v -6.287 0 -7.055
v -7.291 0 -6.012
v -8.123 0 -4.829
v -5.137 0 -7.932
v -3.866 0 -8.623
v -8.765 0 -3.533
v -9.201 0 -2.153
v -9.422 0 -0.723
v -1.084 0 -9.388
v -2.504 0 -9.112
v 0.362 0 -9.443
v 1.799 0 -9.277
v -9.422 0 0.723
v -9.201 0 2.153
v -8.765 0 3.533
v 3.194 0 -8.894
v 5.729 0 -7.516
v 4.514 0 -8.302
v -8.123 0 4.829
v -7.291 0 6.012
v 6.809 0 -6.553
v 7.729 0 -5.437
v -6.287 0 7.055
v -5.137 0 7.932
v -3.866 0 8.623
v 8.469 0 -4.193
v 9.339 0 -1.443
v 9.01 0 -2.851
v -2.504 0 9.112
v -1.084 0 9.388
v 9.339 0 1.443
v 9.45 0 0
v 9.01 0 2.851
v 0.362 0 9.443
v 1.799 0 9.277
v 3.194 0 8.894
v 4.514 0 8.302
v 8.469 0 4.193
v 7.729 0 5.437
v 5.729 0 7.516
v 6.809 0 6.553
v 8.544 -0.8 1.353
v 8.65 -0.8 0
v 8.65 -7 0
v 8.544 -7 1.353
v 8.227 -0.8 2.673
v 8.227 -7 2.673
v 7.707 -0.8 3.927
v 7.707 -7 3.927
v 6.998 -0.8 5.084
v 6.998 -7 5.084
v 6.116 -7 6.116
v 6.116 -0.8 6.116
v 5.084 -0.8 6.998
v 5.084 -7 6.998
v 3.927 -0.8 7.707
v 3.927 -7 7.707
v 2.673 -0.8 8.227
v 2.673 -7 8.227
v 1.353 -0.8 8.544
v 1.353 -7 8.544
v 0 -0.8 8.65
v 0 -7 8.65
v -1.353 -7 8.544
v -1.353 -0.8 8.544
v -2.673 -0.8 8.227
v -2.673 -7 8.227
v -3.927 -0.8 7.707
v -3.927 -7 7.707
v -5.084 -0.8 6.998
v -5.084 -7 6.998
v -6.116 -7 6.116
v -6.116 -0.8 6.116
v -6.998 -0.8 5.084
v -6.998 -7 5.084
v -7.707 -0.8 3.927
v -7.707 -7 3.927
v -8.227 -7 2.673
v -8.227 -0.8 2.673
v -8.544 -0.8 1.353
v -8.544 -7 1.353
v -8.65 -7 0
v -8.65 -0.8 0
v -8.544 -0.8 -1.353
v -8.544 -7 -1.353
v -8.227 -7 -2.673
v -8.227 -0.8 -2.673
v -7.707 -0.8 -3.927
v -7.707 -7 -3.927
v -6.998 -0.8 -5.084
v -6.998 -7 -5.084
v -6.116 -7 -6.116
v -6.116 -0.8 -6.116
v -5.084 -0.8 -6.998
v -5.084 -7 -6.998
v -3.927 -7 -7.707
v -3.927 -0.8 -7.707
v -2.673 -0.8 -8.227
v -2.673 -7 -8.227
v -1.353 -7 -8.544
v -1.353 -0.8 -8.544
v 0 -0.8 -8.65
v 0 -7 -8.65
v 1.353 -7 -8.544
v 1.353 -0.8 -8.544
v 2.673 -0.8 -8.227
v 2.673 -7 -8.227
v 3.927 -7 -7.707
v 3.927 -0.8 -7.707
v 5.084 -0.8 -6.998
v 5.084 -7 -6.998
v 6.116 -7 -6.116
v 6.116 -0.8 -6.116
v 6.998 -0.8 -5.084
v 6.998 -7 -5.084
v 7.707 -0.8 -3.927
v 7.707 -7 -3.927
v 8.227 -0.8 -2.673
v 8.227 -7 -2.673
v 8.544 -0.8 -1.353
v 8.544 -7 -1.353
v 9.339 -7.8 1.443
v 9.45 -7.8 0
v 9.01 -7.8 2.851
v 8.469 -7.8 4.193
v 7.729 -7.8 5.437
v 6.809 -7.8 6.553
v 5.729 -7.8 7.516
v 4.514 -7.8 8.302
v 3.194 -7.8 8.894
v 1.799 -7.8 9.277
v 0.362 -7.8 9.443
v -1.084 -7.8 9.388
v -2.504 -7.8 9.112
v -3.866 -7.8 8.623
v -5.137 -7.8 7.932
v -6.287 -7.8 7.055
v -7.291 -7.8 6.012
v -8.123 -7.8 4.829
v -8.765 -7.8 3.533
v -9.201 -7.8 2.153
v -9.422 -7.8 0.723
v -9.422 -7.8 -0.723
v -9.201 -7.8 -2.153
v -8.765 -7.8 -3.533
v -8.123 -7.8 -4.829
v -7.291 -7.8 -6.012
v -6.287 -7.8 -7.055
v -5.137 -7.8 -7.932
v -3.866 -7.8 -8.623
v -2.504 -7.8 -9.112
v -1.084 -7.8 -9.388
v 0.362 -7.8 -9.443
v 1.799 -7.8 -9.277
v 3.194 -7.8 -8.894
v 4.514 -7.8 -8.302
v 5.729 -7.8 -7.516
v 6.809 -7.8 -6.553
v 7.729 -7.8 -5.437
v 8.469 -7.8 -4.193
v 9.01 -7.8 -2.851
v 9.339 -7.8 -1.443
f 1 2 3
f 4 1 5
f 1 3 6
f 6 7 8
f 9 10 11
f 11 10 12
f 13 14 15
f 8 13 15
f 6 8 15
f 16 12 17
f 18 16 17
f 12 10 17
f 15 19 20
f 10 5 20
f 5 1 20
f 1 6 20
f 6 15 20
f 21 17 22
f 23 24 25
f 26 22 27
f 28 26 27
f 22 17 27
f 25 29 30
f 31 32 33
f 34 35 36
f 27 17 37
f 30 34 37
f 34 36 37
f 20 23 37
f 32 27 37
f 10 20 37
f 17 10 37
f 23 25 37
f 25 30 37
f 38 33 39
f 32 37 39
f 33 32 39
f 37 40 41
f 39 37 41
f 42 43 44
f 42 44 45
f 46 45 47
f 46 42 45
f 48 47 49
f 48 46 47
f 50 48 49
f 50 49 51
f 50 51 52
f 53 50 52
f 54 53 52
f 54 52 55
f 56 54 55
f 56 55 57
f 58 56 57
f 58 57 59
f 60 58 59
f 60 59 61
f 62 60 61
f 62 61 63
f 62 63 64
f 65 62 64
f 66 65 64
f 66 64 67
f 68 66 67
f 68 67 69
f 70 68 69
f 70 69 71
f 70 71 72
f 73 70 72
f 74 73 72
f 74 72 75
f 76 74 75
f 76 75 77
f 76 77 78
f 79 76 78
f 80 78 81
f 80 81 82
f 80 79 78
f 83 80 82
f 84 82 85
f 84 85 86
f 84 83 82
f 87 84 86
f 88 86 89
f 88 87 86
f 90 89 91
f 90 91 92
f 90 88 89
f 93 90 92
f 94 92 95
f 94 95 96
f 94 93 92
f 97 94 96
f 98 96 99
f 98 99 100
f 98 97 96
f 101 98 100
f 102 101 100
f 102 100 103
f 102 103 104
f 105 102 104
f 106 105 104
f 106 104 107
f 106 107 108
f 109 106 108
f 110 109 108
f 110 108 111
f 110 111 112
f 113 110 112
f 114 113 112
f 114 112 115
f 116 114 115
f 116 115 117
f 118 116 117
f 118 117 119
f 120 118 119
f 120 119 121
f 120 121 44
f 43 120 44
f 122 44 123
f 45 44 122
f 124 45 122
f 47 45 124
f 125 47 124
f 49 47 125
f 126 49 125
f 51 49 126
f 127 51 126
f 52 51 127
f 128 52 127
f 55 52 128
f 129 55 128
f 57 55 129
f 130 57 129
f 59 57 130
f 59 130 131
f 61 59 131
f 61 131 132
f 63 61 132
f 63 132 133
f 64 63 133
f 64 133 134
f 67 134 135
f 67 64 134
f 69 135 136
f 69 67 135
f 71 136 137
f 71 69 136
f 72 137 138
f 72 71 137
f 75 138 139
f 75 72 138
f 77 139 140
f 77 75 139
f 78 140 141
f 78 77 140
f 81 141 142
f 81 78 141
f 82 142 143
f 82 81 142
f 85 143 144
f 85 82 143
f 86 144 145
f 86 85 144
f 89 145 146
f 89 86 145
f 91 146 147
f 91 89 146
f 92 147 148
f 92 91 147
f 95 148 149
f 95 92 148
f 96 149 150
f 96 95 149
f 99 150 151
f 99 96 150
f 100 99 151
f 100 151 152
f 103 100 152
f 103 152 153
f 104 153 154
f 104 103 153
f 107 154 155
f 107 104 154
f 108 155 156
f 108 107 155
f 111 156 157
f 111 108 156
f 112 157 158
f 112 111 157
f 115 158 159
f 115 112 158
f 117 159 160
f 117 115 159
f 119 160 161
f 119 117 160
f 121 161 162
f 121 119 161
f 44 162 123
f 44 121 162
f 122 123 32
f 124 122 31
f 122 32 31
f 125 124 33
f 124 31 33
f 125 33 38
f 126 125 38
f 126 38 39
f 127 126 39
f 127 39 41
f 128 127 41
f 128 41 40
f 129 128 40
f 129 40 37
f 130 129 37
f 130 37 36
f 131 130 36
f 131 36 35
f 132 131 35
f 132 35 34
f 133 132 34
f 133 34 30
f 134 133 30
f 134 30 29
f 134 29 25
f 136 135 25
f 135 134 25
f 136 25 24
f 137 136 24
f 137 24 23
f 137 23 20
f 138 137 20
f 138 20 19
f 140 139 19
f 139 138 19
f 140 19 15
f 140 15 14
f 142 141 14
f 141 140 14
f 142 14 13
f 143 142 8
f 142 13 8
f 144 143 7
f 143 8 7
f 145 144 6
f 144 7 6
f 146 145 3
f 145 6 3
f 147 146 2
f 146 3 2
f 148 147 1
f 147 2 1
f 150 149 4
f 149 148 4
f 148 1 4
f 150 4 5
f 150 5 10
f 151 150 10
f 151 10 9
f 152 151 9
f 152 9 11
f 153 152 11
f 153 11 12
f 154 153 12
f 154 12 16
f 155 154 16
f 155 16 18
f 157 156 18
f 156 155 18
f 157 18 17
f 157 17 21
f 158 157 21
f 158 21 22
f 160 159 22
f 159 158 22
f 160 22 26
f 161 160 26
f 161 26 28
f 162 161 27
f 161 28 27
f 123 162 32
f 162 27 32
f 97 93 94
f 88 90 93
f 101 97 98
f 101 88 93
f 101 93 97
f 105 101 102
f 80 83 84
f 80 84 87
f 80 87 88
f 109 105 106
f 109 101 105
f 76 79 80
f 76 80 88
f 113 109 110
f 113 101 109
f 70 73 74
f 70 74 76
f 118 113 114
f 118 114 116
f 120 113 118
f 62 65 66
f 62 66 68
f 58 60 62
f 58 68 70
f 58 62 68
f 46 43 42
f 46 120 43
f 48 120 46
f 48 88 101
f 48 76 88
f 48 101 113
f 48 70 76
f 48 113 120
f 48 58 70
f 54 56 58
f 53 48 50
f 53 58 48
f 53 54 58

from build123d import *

# Parameters (mm, degrees)
F0_R     = 9.45
F0_R_2   = 8.65
F1_DEPTH = 8
F2_R     = 8.65
F3_DEPTH = 0.8


# Not quite as in the source:
# - a fillet or chamfer that OpenCascade refuses, or shapes differently, is made with other operations: its cross-section is extruded or revolved along the edge and cut away or added


with BuildPart() as f1:
    # F0 (on Front) → F1 (new body)
    with BuildSketch(Plane.XZ):
        Circle(F0_R)
        Circle(F0_R_2, mode=Mode.SUBTRACT)
    extrude(amount=F1_DEPTH)

    # F2 (on Front) → F3 (join)
    with BuildSketch(Plane.XZ):
        Circle(F2_R)
    extrude(amount=F3_DEPTH)

    # F4: chamfer of 1 on 1 edges, made by hand

    # F4_s1 → F4_t2 (revolve, cut)
    with BuildSketch(Plane.XY):
        Polygon((9.65, -8), (8.65, -7), (8.65, -8), align=None)
    revolve(axis=Axis((0, -8, 0), (0, -1, 0)), mode=Mode.SUBTRACT)


solid = f1.part
